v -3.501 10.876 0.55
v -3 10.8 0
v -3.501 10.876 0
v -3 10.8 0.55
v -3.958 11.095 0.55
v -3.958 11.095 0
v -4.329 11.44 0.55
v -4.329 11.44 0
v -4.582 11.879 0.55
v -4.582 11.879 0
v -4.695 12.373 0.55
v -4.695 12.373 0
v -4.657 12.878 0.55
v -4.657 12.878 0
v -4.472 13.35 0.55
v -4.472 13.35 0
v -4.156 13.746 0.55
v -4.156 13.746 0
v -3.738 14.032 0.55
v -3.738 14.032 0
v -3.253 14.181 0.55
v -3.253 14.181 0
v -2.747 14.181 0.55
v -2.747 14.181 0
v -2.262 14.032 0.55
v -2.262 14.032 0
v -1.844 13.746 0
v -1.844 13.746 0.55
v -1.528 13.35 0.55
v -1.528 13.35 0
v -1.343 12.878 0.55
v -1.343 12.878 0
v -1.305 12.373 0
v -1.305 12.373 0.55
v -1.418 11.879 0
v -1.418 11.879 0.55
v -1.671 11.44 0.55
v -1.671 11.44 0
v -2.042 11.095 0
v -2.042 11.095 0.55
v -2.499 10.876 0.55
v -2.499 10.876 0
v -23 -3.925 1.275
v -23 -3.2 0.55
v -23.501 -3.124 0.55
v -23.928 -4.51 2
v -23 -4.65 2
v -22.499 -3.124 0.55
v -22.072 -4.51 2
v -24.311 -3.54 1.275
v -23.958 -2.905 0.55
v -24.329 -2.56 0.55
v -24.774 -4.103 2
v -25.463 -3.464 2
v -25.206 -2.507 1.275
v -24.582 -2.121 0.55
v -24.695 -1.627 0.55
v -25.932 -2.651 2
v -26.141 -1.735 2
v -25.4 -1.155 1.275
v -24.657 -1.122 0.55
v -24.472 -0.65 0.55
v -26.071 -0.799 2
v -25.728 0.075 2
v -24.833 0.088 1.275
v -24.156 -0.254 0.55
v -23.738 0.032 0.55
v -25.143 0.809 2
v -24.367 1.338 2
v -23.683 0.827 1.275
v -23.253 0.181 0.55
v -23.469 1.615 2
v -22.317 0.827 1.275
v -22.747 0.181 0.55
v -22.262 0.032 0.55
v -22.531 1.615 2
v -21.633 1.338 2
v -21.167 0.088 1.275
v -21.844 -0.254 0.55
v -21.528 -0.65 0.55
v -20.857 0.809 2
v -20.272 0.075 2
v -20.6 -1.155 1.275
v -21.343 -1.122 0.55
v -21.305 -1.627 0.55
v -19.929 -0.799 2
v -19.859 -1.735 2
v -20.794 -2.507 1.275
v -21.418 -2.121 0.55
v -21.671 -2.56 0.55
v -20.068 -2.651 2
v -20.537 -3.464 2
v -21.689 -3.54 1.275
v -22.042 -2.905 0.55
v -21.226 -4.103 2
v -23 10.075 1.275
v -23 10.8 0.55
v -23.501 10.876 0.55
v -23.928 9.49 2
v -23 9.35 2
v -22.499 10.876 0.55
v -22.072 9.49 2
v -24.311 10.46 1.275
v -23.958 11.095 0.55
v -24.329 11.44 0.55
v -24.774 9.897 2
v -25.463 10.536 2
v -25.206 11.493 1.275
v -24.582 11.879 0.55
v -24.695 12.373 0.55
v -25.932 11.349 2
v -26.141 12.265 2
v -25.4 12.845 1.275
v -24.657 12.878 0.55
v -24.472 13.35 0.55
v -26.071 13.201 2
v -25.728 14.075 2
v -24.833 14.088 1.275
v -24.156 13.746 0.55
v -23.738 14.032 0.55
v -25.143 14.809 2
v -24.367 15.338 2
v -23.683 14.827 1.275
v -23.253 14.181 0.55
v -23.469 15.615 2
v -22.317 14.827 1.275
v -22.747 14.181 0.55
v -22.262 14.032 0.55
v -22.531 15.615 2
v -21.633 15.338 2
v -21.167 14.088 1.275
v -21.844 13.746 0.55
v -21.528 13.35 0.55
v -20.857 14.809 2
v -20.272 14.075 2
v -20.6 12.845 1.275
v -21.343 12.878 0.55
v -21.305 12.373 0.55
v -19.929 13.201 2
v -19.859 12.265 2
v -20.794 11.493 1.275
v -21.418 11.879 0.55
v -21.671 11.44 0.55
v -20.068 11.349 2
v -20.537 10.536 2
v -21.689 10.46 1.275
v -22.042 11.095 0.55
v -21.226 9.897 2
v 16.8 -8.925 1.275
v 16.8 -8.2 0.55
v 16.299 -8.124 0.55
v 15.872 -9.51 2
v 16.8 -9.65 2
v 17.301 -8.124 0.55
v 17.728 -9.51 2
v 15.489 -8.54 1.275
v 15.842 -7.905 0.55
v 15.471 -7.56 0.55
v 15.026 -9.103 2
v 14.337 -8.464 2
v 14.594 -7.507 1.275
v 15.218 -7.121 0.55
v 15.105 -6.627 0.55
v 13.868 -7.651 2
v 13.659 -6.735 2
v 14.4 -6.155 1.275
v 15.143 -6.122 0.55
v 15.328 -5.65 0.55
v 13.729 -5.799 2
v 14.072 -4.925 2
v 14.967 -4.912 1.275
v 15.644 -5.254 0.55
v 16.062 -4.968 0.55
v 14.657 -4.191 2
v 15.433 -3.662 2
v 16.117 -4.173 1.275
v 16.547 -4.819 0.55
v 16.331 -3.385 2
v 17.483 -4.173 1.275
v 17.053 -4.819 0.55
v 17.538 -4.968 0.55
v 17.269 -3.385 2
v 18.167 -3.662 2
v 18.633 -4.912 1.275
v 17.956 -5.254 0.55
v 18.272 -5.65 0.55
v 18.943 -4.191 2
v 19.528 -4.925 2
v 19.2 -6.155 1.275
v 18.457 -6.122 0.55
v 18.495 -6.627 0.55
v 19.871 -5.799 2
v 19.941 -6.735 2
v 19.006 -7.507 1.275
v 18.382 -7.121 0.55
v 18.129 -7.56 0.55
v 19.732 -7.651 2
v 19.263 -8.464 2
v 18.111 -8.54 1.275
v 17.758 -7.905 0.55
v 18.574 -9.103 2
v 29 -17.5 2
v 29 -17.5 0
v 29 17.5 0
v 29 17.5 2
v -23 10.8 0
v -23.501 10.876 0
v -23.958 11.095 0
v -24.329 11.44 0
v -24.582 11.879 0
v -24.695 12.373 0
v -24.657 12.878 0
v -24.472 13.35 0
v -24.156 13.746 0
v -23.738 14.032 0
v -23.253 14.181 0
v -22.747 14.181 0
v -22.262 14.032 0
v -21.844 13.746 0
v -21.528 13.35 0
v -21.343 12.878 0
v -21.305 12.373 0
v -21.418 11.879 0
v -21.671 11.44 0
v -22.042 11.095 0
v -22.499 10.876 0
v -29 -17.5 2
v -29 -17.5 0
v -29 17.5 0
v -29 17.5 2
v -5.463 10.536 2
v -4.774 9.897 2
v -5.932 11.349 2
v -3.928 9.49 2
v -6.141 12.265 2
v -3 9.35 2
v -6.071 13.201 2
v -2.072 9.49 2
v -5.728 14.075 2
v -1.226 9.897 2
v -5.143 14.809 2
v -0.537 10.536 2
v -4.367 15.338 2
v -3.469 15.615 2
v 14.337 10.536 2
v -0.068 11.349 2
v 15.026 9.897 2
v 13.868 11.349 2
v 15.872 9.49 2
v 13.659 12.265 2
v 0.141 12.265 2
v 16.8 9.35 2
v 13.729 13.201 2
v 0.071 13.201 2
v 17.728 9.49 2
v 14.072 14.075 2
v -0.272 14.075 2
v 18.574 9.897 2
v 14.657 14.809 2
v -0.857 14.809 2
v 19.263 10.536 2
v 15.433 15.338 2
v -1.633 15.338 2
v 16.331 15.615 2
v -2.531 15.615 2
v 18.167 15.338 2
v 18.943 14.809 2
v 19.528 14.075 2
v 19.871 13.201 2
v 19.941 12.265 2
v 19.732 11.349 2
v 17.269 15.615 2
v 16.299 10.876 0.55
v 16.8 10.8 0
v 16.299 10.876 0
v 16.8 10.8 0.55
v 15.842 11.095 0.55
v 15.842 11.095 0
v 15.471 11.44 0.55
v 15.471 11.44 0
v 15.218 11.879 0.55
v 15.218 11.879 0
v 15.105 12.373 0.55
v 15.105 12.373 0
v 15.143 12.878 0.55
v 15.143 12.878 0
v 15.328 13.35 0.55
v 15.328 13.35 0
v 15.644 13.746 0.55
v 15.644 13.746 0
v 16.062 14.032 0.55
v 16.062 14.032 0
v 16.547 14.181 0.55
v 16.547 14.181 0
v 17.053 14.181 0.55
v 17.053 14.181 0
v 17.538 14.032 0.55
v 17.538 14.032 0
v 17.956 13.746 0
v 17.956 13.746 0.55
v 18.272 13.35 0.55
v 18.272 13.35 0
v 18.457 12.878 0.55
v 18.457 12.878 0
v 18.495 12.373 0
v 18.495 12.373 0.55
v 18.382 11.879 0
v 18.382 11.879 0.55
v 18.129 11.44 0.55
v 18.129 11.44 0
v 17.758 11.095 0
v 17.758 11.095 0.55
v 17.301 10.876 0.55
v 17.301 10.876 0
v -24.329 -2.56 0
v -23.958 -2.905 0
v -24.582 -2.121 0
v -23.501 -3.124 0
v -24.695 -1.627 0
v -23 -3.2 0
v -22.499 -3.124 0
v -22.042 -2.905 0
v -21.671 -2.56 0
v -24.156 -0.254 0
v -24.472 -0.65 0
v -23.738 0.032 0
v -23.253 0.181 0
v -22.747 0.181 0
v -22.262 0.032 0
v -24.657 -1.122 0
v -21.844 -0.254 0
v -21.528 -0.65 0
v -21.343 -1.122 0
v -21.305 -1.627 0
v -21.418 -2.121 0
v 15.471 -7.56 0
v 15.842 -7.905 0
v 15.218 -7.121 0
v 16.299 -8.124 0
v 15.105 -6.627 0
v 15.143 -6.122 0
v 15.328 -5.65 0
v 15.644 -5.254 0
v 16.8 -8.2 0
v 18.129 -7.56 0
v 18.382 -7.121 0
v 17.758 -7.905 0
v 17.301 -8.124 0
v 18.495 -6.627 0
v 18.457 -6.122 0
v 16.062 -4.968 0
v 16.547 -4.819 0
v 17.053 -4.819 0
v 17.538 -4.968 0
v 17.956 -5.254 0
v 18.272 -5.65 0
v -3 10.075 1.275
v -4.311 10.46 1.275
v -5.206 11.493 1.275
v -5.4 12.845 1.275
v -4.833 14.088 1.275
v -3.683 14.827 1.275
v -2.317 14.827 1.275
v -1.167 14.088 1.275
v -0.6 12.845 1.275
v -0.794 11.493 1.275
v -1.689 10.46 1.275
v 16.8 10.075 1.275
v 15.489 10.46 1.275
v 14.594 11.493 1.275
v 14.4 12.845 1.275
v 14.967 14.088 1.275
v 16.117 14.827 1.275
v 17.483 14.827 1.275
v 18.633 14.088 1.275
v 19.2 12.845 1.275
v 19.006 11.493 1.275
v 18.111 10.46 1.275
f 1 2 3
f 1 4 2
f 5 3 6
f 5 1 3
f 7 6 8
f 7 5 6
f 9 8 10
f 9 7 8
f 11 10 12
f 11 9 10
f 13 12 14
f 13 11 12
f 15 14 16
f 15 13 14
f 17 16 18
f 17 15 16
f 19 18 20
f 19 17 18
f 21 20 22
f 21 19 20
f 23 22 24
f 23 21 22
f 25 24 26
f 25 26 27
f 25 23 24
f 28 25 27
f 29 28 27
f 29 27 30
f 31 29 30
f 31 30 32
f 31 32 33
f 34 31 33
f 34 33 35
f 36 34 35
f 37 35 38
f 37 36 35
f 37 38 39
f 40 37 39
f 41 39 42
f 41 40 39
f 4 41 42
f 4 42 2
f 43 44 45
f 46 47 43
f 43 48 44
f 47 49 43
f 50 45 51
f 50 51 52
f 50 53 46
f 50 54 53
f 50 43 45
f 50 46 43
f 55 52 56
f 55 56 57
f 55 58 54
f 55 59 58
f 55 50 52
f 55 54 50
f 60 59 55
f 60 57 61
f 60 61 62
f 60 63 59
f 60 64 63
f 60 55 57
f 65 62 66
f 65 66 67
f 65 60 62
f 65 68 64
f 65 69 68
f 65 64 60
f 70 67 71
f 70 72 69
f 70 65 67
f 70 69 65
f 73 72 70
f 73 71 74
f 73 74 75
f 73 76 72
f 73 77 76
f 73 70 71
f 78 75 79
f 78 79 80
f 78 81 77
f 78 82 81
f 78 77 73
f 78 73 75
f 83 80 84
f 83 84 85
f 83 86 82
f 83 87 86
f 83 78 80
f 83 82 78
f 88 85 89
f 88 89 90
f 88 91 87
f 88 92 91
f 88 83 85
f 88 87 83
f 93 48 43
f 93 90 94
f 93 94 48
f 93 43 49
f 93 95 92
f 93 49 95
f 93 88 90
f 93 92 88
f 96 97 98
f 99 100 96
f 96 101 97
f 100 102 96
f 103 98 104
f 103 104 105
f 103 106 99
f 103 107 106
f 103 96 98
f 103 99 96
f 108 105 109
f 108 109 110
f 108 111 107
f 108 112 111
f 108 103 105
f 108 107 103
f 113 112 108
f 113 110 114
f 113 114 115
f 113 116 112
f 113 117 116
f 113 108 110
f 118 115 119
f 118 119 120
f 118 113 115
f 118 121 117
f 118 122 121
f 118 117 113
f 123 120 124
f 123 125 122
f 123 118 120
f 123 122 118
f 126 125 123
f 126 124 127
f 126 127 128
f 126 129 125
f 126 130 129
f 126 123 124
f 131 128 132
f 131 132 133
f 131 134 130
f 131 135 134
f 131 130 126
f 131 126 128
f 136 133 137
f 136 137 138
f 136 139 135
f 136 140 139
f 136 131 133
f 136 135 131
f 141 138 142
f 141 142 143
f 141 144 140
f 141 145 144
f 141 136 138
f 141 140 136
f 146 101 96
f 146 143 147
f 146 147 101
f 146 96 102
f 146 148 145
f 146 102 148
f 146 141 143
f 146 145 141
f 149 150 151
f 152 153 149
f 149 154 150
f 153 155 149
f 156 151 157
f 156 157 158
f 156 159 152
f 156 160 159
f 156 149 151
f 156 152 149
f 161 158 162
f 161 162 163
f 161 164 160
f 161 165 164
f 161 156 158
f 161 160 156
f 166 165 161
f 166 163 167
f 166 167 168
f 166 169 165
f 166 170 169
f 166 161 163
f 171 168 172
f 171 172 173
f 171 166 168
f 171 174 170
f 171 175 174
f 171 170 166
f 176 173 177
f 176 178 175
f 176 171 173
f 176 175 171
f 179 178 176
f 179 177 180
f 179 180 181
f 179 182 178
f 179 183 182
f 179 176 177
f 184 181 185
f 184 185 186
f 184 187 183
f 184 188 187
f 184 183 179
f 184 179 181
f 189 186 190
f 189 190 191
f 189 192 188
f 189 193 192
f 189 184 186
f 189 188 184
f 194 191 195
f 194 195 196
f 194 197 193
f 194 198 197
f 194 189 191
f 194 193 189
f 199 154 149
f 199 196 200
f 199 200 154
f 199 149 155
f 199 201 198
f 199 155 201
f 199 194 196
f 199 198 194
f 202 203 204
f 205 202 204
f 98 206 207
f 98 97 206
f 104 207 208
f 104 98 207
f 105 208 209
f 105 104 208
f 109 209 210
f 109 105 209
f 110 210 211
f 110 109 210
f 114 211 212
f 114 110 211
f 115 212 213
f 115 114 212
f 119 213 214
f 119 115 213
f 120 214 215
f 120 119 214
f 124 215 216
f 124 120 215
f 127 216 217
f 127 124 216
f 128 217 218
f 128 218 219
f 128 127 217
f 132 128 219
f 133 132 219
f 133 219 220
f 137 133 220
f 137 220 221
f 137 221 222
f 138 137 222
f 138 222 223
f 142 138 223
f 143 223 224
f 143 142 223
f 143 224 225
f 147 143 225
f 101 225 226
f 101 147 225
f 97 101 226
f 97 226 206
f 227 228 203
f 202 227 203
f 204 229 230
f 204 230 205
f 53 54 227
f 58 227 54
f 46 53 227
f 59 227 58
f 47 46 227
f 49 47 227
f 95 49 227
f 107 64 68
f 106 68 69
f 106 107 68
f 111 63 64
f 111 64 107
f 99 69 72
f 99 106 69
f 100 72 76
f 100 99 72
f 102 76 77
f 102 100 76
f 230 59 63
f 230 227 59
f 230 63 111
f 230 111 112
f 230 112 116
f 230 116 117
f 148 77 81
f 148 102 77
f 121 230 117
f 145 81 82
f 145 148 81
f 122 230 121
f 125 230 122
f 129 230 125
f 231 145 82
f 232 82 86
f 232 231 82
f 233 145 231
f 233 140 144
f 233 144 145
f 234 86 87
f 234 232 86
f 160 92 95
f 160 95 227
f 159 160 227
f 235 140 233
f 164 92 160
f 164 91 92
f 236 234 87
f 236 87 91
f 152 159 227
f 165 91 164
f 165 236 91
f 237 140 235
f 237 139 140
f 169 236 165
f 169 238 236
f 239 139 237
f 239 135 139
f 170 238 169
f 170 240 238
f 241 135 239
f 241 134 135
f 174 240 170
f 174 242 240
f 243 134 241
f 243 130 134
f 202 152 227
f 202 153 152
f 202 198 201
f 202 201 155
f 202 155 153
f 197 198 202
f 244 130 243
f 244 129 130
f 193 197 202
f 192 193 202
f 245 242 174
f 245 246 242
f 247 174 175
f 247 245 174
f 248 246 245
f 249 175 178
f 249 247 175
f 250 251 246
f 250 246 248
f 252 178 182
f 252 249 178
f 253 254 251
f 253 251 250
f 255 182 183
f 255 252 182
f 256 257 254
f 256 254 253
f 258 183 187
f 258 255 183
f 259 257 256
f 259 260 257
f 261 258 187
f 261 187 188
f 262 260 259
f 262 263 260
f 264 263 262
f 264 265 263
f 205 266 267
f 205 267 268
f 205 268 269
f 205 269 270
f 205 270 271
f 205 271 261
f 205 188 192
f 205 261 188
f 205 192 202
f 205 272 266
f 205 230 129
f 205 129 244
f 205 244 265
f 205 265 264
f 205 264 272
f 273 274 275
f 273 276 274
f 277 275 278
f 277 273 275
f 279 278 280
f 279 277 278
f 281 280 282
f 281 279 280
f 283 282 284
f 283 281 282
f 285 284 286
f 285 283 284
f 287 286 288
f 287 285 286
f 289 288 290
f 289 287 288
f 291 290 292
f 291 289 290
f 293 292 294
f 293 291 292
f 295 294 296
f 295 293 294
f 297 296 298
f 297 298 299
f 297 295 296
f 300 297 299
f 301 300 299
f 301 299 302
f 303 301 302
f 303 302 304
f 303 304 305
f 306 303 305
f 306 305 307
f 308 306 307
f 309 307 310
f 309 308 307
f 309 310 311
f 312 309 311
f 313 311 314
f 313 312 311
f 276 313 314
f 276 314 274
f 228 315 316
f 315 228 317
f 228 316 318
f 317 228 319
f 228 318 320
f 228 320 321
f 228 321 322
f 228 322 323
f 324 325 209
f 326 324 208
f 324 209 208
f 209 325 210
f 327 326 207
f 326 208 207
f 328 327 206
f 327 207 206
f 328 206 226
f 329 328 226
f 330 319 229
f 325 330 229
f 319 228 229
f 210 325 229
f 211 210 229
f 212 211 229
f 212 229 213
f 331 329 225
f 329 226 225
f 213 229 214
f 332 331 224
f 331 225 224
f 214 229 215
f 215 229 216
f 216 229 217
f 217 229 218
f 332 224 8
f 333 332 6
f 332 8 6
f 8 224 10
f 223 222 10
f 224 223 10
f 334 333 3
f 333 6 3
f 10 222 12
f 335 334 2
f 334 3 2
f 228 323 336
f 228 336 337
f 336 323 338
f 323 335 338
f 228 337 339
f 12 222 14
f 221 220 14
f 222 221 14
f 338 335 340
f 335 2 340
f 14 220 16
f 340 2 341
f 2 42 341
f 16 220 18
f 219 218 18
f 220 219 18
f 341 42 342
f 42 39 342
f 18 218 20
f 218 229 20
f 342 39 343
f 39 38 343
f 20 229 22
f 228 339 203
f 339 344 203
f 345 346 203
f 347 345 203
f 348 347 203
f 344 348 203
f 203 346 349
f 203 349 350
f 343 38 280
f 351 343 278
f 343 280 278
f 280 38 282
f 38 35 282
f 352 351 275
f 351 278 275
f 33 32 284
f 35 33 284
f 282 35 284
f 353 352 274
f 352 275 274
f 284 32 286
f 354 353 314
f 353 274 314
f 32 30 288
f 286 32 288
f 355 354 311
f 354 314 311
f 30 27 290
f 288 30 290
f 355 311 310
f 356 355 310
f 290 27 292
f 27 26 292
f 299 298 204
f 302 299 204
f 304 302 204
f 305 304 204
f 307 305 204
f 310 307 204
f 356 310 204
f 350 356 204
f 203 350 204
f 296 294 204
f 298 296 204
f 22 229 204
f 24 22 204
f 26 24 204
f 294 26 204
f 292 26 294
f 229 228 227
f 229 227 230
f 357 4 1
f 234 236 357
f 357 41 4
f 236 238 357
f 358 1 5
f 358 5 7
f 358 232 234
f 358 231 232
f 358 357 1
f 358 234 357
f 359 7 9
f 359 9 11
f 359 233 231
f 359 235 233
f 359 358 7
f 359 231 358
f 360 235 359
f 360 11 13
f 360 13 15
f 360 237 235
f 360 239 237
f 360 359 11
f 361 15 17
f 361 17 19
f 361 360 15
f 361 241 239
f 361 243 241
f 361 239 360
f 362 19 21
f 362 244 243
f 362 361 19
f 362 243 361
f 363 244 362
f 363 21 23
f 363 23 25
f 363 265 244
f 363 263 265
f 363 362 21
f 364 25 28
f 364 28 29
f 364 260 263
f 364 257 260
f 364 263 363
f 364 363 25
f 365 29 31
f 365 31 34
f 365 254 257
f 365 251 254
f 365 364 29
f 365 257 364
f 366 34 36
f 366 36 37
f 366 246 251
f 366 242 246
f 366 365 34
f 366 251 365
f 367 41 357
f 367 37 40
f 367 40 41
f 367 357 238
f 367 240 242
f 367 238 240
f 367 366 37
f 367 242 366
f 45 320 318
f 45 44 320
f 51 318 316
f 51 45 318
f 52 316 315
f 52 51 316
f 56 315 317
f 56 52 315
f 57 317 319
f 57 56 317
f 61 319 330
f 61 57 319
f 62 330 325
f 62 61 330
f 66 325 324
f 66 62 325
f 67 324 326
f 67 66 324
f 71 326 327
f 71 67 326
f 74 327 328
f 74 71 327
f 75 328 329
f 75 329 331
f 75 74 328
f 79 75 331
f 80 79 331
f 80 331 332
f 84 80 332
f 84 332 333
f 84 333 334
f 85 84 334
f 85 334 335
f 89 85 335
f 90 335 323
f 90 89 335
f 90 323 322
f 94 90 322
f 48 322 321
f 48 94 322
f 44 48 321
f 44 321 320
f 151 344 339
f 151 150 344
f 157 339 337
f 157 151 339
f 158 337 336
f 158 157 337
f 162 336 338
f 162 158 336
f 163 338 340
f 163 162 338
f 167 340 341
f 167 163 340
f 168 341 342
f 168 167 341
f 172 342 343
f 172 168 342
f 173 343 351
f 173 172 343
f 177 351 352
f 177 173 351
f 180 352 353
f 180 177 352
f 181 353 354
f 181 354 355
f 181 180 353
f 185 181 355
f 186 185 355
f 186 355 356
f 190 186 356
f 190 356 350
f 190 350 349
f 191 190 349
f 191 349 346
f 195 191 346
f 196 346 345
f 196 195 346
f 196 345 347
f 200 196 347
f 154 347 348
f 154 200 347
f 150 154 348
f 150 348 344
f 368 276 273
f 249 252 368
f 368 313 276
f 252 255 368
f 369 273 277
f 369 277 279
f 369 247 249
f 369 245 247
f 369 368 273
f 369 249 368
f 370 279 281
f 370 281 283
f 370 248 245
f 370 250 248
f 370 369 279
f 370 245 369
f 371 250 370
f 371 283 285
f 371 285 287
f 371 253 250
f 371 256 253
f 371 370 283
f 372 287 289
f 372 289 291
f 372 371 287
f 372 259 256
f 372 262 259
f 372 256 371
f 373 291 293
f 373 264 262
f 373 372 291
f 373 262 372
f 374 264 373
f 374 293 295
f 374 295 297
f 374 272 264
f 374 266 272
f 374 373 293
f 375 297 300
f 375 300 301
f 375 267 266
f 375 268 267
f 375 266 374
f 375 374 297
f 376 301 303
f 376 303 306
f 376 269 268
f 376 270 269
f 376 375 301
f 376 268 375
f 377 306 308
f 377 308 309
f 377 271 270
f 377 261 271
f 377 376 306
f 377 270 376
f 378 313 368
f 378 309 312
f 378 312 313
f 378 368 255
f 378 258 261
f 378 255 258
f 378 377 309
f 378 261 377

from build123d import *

# Parameters (mm, degrees)
SKETCH1_W                                    = 58
SKETCH1_H                                    = 35
BOSS_EXTRUDE1_DEPTH                          = 2
CSK_FOR_M3_FLAT_COUNTERSUNK_HEAD_SCR_2_COUNT = 2
CSK_FOR_M3_FLAT_COUNTERSUNK_HEAD_SCR_2_PITCH = 20
CSK_FOR_M3_FLAT_COUNTERSUNK_HEAD_SCR_3_COUNT = 2
CSK_FOR_M3_FLAT_COUNTERSUNK_HEAD_SCR_3_PITCH = 39.8
CSK_FOR_M3_FLAT_COUNTERSUNK_HEAD_SCR_4_COUNT = 2
CSK_FOR_M3_FLAT_COUNTERSUNK_HEAD_SCR_4_PITCH = 44.102607633
CSK_FOR_M3_FLAT_COUNTERSUNK_HEAD_SCR_5_COUNT = 2
CSK_FOR_M3_FLAT_COUNTERSUNK_HEAD_SCR_5_PITCH = 14


with BuildPart() as part:
    # Sketch1 → Boss-Extrude1 (new body)
    with BuildSketch(Plane.XY):
        Rectangle(SKETCH1_W, SKETCH1_H)
    extrude(amount=BOSS_EXTRUDE1_DEPTH)

    # Sketch3 → CSK for M3 Flat Countersunk Head Screw1 (revolve, cut)
    with BuildSketch(Plane(origin=(-23, 12.5, 2), x_dir=(0, -1, 0), z_dir=(1, 0, 0))):
        Polygon((0, 0), (0, 2), (1.7, 2), (1.7, 1.45), (3.15, 0), align=None)
    csk_for_m3_flat_countersunk_head_screw1 = revolve(axis=Axis((-23, 12.5, 8.35), (0, 0, -1)), mode=Mode.SUBTRACT)

    # CSK for M3 Flat Countersunk Head Scr 2: CSK for M3 Flat Countersunk Head Screw1 ×2
    with Locations(*[(i * CSK_FOR_M3_FLAT_COUNTERSUNK_HEAD_SCR_2_PITCH, 0, 0) for i in range(1, CSK_FOR_M3_FLAT_COUNTERSUNK_HEAD_SCR_2_COUNT)]):
        add(csk_for_m3_flat_countersunk_head_screw1, mode=Mode.SUBTRACT)

    # CSK for M3 Flat Countersunk Head Scr 3: CSK for M3 Flat Countersunk Head Screw1 ×2
    with Locations(*[(i * CSK_FOR_M3_FLAT_COUNTERSUNK_HEAD_SCR_3_PITCH, 0, 0) for i in range(1, CSK_FOR_M3_FLAT_COUNTERSUNK_HEAD_SCR_3_COUNT)]):
        add(csk_for_m3_flat_countersunk_head_screw1, mode=Mode.SUBTRACT)

    # CSK for M3 Flat Countersunk Head Scr 4: CSK for M3 Flat Countersunk Head Screw1 ×2
    with Locations(*[Vector(0.90244097, -0.430813528, 0) * (i * CSK_FOR_M3_FLAT_COUNTERSUNK_HEAD_SCR_4_PITCH) for i in range(1, CSK_FOR_M3_FLAT_COUNTERSUNK_HEAD_SCR_4_COUNT)]):
        add(csk_for_m3_flat_countersunk_head_screw1, mode=Mode.SUBTRACT)

    # CSK for M3 Flat Countersunk Head Scr 5: CSK for M3 Flat Countersunk Head Screw1 ×2
    with Locations(*[(0, -i * CSK_FOR_M3_FLAT_COUNTERSUNK_HEAD_SCR_5_PITCH, 0) for i in range(1, CSK_FOR_M3_FLAT_COUNTERSUNK_HEAD_SCR_5_COUNT)]):
        add(csk_for_m3_flat_countersunk_head_screw1, mode=Mode.SUBTRACT)


solid = part.part
